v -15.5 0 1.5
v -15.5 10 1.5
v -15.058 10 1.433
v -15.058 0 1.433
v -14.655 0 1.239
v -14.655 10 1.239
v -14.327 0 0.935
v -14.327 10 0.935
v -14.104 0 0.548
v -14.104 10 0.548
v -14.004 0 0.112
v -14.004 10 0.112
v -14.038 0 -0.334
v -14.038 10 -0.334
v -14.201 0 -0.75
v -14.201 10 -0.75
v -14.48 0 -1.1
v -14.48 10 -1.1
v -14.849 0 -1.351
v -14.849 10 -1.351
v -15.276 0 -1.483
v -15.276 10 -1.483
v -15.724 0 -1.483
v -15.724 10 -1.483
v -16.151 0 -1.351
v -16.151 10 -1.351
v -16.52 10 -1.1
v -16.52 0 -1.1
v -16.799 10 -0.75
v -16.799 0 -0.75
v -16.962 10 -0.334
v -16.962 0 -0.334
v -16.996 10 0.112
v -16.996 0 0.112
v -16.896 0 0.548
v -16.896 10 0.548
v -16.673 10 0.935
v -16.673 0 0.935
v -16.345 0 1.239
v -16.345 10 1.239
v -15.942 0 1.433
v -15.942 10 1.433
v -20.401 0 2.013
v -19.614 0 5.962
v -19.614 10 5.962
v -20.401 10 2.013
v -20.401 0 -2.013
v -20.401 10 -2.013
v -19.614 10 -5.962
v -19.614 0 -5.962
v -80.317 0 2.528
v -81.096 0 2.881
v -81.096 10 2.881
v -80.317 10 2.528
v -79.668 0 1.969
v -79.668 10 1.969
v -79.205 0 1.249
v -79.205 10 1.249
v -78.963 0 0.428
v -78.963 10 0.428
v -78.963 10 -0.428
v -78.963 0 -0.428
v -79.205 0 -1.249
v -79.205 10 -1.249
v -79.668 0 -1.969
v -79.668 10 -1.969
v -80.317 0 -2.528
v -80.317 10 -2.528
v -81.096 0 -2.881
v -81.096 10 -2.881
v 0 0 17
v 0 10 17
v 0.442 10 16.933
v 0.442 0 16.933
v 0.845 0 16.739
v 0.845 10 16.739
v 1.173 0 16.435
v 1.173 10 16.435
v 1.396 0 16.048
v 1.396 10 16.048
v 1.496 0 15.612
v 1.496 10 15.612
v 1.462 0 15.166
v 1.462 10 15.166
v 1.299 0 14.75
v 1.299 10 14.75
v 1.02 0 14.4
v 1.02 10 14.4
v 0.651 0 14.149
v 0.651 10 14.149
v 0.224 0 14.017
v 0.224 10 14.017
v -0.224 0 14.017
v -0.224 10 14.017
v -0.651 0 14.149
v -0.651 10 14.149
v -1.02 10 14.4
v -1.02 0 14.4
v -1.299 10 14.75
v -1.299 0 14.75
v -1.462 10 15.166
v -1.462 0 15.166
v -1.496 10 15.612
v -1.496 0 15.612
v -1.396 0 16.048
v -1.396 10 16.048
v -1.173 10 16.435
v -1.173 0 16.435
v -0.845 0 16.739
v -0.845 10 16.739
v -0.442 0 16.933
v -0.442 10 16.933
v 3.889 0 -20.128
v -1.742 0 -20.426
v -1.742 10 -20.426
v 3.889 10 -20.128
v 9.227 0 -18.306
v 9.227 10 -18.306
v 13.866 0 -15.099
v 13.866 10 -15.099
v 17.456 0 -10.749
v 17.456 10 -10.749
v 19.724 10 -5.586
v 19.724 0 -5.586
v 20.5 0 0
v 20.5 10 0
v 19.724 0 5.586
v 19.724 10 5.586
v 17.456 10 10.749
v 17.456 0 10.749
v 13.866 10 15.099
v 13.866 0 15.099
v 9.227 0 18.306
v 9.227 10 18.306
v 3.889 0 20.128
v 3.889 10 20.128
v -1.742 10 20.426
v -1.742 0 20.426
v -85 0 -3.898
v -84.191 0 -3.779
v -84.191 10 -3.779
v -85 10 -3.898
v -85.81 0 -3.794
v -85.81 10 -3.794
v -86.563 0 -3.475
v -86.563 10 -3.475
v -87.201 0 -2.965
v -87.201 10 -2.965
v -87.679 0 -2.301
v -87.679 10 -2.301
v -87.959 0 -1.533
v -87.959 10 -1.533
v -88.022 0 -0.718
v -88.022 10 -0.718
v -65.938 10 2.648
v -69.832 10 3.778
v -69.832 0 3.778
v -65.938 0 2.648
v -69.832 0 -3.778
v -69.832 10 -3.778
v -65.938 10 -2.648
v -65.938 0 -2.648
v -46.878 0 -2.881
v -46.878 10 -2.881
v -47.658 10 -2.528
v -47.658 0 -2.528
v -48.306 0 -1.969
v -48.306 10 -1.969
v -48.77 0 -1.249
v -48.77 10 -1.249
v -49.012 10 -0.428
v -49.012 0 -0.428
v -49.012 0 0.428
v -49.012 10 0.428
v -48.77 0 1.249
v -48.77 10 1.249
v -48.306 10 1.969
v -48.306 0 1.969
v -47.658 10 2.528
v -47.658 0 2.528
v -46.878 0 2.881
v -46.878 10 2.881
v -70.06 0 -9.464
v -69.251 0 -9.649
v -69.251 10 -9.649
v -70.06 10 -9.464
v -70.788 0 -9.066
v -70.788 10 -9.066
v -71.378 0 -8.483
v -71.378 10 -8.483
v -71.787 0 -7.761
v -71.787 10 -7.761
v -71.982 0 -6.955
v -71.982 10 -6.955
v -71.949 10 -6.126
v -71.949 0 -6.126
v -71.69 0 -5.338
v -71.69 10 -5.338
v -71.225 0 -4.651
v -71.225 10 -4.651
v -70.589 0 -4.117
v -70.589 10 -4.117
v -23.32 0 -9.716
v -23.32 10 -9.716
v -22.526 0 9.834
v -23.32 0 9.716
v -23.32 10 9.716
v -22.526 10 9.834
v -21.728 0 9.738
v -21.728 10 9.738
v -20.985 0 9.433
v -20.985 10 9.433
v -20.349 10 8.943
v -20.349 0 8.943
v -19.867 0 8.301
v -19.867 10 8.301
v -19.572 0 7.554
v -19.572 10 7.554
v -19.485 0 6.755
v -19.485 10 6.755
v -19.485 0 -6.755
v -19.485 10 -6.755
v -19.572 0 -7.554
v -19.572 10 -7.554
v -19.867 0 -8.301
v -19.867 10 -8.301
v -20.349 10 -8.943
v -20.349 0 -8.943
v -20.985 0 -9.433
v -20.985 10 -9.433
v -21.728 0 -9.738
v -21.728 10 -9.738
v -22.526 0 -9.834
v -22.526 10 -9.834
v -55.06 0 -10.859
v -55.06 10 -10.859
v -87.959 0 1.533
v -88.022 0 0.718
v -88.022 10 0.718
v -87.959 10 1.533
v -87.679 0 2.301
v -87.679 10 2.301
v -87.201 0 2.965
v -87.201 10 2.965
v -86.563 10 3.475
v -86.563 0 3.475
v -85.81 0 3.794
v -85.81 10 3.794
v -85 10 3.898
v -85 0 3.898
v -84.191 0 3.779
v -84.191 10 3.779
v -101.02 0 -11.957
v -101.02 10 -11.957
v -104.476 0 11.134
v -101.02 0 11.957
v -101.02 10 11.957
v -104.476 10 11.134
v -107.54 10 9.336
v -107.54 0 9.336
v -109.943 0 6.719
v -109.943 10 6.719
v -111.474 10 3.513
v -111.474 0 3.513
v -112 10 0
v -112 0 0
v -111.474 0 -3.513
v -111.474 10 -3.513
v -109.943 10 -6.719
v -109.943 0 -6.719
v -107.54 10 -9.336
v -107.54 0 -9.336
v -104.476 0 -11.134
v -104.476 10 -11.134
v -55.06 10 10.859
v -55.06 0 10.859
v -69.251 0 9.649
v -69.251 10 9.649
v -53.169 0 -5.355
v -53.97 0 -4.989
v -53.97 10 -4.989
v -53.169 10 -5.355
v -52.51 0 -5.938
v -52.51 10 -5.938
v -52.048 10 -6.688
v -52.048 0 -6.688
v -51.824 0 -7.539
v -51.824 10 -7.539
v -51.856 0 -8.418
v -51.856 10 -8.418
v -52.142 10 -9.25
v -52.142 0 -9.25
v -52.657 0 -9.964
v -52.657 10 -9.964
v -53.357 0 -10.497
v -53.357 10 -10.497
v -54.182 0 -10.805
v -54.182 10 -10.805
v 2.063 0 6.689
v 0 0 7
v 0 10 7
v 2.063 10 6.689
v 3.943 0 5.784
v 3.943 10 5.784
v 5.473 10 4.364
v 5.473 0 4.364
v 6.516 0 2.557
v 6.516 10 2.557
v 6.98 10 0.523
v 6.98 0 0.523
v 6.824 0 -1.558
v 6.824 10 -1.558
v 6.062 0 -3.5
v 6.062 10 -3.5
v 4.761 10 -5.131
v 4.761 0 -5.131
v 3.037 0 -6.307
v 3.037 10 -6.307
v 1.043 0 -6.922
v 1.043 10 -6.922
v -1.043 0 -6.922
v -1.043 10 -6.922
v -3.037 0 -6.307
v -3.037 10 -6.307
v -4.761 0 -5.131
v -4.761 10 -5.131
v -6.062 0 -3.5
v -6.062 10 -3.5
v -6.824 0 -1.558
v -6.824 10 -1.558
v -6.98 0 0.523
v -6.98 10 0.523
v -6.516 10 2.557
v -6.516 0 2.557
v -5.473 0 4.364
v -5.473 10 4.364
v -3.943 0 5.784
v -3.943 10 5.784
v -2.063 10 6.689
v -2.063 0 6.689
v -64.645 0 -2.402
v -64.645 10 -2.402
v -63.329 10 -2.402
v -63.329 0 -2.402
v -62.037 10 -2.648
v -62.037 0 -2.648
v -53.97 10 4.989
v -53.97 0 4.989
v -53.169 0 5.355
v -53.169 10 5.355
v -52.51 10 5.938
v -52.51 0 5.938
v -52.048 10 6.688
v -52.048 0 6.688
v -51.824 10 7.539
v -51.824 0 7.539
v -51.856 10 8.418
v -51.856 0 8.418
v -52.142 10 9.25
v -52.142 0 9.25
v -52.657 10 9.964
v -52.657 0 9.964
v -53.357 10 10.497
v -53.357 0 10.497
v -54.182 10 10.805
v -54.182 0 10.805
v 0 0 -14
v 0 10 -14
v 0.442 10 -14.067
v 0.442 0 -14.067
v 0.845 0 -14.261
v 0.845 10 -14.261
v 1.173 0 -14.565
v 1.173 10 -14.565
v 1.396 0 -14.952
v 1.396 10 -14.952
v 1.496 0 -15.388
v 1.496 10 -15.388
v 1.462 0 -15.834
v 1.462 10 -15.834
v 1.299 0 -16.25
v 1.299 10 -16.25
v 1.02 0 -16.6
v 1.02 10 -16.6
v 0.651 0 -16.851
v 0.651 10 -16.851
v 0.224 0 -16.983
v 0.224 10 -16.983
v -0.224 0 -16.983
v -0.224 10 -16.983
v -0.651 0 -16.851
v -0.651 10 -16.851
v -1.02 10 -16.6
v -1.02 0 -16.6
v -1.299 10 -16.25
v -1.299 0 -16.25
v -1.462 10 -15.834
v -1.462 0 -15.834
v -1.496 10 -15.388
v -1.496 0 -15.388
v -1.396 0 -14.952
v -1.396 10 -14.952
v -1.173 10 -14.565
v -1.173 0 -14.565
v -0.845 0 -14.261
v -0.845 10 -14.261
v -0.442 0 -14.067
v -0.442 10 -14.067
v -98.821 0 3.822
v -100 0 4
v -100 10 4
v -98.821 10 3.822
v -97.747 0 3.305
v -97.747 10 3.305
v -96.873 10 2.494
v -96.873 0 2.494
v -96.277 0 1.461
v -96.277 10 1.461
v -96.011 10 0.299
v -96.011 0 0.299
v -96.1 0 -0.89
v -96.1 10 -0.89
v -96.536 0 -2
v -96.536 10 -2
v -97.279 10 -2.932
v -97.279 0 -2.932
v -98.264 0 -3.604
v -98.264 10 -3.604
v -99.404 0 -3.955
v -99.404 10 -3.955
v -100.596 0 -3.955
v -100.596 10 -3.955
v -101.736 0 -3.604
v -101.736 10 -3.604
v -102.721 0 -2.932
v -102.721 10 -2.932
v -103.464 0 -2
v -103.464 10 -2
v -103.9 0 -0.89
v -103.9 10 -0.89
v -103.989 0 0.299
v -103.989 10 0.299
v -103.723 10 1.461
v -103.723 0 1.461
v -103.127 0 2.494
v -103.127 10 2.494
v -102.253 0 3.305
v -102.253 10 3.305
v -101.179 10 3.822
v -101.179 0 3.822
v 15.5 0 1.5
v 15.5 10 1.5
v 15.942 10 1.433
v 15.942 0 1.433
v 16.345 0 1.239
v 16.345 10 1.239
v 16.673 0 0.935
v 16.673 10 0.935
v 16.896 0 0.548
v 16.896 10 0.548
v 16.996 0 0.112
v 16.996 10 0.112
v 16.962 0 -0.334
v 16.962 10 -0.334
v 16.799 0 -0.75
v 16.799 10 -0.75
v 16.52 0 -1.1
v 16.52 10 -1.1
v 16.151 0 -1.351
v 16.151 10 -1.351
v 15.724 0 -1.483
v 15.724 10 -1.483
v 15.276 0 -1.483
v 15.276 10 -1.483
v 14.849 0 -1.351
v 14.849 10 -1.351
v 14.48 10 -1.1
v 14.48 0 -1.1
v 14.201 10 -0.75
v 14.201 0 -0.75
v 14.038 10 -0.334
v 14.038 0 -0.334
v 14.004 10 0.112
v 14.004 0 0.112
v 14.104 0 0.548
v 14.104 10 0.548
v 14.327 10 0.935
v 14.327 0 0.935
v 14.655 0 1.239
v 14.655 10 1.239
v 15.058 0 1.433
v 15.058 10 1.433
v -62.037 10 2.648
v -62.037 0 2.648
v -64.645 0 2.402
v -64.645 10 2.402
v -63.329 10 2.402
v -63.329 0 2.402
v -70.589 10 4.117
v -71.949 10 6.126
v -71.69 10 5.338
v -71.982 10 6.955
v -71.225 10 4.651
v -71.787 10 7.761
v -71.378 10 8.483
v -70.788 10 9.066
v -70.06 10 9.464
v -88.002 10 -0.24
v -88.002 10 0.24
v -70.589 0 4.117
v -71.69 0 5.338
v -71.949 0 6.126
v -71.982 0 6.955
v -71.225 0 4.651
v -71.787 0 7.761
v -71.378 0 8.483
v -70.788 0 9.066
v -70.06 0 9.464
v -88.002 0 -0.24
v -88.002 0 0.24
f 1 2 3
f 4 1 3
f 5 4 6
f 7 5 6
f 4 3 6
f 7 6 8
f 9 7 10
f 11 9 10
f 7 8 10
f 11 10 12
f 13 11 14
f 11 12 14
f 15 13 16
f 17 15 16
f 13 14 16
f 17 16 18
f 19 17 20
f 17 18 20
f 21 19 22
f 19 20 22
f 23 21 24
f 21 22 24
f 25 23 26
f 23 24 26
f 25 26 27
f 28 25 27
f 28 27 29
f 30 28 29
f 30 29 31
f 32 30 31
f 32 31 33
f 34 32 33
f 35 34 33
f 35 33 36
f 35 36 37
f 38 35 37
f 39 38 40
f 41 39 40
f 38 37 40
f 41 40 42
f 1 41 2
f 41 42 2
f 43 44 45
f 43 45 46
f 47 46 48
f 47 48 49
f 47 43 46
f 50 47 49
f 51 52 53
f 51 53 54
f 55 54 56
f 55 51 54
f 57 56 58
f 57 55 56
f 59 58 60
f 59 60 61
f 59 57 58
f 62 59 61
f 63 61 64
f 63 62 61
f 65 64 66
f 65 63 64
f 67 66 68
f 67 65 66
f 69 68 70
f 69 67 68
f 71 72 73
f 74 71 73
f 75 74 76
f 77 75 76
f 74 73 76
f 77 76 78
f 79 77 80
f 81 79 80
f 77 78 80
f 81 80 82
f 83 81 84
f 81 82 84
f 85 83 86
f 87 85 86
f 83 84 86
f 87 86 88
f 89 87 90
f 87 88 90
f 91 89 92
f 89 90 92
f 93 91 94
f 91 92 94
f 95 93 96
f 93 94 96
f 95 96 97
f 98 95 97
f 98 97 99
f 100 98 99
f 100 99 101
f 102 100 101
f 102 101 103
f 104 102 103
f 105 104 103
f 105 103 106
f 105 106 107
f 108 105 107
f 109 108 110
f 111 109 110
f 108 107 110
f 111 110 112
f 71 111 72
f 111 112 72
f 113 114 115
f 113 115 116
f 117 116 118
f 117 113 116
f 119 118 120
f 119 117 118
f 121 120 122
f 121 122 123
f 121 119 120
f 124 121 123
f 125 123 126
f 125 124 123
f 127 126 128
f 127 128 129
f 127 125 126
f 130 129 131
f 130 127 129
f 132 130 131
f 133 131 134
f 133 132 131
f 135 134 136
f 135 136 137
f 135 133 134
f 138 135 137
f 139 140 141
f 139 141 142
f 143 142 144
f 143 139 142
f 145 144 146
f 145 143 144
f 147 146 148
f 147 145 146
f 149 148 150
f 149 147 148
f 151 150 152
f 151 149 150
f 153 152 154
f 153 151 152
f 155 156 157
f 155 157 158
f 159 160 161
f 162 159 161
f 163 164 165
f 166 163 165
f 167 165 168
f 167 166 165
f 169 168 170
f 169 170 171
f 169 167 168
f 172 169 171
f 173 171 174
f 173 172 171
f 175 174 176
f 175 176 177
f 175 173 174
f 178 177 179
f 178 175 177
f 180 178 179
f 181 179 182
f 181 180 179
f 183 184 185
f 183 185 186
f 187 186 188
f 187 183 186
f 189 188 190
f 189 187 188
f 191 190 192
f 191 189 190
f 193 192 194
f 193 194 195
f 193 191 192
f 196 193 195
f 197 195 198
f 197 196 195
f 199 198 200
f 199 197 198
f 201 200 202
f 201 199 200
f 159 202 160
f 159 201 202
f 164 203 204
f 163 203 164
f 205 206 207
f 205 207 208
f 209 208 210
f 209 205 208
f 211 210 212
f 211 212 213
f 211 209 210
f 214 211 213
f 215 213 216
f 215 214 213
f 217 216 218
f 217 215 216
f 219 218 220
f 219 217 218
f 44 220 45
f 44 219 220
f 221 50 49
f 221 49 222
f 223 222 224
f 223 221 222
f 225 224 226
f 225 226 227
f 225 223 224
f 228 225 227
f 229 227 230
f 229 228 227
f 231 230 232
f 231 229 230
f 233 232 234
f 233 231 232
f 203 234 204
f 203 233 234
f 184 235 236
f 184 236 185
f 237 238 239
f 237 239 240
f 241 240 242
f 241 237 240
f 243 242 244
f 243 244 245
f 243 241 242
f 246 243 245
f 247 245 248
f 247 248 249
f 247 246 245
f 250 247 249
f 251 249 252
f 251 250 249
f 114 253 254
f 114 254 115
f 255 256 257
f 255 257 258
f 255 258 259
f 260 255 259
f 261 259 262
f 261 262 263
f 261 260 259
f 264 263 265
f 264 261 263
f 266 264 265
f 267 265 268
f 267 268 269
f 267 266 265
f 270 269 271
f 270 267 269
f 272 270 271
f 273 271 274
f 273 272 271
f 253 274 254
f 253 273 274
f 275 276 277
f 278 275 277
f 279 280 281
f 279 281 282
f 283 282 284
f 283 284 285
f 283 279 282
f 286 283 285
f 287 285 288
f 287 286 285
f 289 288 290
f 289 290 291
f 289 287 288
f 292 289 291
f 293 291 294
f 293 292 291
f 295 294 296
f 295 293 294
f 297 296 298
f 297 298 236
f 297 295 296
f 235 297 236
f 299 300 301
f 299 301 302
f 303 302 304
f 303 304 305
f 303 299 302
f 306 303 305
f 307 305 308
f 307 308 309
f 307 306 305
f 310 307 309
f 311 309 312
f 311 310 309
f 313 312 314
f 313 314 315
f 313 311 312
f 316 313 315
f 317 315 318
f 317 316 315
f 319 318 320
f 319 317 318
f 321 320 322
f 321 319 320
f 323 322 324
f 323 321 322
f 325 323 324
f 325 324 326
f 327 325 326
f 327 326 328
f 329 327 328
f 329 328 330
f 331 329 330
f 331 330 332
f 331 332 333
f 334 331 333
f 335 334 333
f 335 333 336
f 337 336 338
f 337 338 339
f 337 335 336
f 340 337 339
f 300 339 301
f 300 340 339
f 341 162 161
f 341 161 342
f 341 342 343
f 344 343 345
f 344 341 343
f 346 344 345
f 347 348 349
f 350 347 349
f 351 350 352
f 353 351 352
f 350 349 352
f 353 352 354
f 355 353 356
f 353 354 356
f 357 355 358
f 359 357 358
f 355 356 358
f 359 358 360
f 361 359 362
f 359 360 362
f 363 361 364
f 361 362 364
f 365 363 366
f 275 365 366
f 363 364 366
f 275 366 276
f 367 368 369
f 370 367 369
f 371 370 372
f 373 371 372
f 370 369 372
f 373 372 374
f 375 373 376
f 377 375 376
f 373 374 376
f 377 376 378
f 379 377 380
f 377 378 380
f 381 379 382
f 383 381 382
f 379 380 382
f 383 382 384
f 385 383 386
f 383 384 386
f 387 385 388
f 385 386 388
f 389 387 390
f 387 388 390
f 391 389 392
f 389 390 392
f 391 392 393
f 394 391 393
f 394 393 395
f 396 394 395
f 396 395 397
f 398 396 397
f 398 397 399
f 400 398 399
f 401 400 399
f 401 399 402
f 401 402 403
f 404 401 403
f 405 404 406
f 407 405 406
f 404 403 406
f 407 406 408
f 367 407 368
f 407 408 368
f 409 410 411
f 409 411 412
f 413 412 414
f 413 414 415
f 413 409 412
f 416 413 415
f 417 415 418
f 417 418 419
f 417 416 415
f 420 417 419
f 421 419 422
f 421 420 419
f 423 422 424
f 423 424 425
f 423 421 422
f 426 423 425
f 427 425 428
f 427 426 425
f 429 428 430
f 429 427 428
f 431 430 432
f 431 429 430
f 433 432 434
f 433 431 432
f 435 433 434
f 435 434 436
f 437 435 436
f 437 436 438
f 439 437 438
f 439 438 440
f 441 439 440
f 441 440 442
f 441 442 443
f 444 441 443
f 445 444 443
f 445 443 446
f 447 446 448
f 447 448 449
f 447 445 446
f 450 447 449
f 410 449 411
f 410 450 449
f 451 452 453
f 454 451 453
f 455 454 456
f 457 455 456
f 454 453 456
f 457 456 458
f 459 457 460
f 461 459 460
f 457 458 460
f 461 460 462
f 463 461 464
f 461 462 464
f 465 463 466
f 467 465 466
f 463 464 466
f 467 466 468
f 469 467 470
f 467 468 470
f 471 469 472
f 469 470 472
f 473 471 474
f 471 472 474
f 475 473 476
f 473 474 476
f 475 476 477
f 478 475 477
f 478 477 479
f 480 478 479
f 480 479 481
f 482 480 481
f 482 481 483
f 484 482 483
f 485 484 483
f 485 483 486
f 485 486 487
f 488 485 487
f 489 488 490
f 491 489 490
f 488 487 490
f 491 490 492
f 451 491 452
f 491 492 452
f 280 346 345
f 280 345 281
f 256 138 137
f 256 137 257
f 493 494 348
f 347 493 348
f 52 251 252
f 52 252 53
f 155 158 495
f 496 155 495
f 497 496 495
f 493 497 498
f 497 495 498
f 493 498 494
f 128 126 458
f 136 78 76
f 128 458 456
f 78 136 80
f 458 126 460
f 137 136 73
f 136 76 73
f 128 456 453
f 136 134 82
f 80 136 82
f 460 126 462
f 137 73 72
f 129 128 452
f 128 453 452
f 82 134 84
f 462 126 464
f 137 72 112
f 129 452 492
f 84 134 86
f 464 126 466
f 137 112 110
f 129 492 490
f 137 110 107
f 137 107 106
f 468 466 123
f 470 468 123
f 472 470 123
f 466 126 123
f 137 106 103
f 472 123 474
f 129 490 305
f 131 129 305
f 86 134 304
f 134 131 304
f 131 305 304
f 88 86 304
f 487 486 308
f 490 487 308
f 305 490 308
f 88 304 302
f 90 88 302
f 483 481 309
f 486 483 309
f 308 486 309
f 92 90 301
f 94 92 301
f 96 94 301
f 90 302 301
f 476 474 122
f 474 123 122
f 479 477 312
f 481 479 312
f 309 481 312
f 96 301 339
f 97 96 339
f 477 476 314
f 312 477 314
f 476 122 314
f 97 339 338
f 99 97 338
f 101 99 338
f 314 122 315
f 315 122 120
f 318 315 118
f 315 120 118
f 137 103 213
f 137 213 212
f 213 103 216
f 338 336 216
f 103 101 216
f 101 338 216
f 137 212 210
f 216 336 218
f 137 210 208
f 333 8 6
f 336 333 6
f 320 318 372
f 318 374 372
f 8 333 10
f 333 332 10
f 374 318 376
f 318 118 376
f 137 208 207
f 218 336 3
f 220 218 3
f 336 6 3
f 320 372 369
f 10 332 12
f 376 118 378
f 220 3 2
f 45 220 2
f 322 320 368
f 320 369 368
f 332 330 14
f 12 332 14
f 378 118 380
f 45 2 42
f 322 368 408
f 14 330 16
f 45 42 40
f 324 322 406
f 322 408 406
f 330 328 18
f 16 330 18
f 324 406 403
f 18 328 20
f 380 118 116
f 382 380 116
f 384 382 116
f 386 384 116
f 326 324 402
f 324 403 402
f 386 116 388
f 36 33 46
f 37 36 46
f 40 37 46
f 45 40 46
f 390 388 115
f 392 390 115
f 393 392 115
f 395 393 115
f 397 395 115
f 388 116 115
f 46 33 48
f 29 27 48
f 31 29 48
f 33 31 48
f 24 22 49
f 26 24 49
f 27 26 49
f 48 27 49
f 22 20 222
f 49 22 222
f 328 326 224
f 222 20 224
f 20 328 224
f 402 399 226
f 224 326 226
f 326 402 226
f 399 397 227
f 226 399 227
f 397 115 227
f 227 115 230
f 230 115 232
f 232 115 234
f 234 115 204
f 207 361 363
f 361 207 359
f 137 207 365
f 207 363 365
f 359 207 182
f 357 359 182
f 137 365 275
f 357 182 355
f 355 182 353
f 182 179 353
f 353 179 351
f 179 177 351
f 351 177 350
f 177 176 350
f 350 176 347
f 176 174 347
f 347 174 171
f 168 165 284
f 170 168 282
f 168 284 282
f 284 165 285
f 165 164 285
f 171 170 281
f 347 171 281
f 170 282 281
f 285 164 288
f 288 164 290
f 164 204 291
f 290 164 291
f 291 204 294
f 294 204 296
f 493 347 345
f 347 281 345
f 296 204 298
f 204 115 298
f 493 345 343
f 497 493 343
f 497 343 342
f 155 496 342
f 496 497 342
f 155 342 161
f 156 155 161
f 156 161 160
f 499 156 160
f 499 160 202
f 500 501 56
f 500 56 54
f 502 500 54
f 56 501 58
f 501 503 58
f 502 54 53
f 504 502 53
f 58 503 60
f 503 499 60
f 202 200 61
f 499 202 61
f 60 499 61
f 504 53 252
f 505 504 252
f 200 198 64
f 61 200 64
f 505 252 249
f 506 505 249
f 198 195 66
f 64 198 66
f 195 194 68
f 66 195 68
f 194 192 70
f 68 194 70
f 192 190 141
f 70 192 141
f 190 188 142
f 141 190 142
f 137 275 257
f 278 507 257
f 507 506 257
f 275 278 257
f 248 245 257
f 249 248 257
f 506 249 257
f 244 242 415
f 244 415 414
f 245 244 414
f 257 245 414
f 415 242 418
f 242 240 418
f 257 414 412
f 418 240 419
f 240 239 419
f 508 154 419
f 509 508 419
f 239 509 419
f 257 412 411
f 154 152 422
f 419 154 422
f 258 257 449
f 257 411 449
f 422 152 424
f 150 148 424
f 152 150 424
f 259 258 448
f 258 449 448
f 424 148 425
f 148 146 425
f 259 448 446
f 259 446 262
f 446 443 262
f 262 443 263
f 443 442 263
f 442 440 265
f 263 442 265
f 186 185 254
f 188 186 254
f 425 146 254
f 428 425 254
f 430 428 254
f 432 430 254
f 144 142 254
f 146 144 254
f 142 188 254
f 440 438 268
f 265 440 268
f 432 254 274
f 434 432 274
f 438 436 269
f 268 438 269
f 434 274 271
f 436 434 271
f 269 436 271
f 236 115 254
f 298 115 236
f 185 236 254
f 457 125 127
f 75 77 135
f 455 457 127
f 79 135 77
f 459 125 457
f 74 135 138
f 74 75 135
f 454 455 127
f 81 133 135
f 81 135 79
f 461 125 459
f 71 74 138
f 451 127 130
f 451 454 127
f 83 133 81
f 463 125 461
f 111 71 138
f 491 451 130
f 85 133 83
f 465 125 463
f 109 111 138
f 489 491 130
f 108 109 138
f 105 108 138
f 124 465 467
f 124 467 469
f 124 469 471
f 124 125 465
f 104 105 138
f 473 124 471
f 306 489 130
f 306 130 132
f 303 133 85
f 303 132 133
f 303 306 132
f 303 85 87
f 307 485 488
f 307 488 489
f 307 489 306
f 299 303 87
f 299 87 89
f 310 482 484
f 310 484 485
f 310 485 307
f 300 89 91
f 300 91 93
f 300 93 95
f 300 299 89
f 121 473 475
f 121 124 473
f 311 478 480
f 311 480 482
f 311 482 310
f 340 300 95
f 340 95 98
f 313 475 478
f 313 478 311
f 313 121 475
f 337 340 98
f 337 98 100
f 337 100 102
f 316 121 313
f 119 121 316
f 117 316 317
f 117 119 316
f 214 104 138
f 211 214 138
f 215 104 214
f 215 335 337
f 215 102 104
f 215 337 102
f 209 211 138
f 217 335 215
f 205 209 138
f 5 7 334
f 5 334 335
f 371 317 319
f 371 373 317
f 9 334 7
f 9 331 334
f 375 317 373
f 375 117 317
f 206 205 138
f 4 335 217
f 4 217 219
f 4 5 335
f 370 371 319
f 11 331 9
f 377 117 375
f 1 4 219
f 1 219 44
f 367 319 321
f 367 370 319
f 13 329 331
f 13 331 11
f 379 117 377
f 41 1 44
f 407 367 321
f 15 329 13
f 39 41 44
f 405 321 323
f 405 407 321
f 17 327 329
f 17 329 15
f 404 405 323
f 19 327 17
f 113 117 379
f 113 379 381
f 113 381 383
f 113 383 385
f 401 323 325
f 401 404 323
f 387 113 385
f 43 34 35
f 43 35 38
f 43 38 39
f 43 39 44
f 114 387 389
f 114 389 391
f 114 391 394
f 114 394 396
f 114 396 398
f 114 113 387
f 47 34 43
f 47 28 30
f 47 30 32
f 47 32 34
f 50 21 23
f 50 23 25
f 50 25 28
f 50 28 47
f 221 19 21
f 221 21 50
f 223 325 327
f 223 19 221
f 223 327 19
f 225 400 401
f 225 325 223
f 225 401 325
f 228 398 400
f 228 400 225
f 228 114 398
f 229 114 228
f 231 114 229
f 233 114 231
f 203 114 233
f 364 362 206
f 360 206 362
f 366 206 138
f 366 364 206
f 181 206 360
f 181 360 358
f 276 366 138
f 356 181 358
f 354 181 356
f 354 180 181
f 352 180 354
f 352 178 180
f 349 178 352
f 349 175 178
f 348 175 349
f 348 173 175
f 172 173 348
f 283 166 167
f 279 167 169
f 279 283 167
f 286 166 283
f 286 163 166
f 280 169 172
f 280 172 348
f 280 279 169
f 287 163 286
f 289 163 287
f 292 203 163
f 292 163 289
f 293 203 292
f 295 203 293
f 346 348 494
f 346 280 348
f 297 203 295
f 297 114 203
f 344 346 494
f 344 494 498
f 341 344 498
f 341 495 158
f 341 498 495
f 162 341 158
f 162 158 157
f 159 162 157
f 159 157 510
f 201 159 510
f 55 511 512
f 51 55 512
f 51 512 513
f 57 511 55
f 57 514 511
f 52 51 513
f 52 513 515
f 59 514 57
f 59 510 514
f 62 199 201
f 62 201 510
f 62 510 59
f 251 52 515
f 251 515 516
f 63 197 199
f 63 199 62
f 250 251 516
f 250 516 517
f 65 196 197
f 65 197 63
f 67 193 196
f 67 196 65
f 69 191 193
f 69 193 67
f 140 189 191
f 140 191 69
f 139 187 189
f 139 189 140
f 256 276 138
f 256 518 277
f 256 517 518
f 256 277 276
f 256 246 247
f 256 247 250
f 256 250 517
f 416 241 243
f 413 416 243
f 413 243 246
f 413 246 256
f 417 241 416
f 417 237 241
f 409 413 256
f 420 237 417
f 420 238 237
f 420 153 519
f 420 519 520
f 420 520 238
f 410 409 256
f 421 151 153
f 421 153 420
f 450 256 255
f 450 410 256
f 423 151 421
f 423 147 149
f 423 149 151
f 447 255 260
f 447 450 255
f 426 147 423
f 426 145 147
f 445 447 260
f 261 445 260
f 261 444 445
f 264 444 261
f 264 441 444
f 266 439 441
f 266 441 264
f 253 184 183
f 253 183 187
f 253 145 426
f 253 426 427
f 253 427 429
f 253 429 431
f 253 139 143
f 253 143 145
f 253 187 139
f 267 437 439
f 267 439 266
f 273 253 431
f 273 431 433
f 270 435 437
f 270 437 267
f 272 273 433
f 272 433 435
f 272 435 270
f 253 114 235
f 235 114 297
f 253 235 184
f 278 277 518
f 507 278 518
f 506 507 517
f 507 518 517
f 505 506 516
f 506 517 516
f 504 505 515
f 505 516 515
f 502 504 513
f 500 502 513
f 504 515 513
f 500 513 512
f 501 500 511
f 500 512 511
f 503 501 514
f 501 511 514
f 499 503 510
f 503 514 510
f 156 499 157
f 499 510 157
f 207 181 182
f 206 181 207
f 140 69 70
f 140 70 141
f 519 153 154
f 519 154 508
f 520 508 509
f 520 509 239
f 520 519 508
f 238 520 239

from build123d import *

# Parameters (mm, degrees)
SKETCH1_R           = 7
SKETCH1_R_2         = 4
BOSS_EXTRUDE1_DEPTH = 10
SKETCH2_R           = 1.5
CUT_EXTRUDE1_DEPTH  = 10


with BuildPart() as part:
    # Sketch1 → Boss-Extrude1 (new body)
    with BuildSketch(Plane(origin=(0, 0, 0), x_dir=(1, 0, 0), z_dir=(0, 1, 0))):
        with BuildLine():
            Line((-1.7425, -20.4258095), (-101.02, -11.956571415))
            ThreePointArc((-101.02, -11.956571415), (-112, 0), (-101.02, 11.956571415))
            Line((-101.02, 11.956571415), (-1.7425, 20.4258095))
            ThreePointArc((-1.7425, 20.4258095), (20.5, 0), (-1.7425, -20.4258095))
        make_face()
        with Locations(Location((0, 0, 0), (0, 0, 270))):
            Circle(SKETCH1_R, mode=Mode.SUBTRACT)
        with Locations(Location((-100, 0, 0), (0, 0, 270))):
            Circle(SKETCH1_R_2, mode=Mode.SUBTRACT)
        with BuildLine():
            Line((-84.191001334, -3.779047898), (-81.096242799, -2.881194367))
            ThreePointArc((-81.096242799, -2.881194367), (-78.932136943, 0), (-81.096242799, 2.881194367))
            Line((-81.096242799, 2.881194367), (-84.191001334, 3.779047898))
            ThreePointArc((-84.191001334, 3.779047898), (-86.899619701, 3.241548046), (-88.021516382, 0.718282824))
            ThreePointArc((-88.021516382, 0.718282824), (-88, 0), (-88.021516382, -0.718282824))
            ThreePointArc((-88.021516382, -0.718282824), (-86.899619701, -3.241548046), (-84.191001334, -3.779047898))
        make_face(mode=Mode.SUBTRACT)
        with BuildLine():
            Line((-69.832249651, -3.778216146), (-65.93770065, -2.648326841))
            ThreePointArc((-65.93770065, -2.648326841), (-63.987280982, -2.371113698), (-62.036861314, -2.648326841))
            Line((-62.036861314, -2.648326841), (-53.969530614, -4.988826518))
            ThreePointArc((-53.969530614, -4.988826518), (-51.855920685, -8.418131938), (-55.060424757, -10.859163739))
            Line((-55.060424757, -10.859163739), (-69.251355507, -9.648553367))
            ThreePointArc((-69.251355507, -9.648553367), (-71.98177462, -6.95483008), (-69.832249651, -3.778216146))
        make_face(mode=Mode.SUBTRACT)
        with BuildLine():
            Line((-46.878319164, -2.881194367), (-23.320026626, -9.715942825))
            ThreePointArc((-23.320026626, -9.715942825), (-20.349346369, -8.942517006), (-19.613817698, -5.962227378))
            ThreePointArc((-19.613817698, -5.962227378), (-20.5, 0), (-19.613817698, 5.962227378))
            ThreePointArc((-19.613817698, 5.962227378), (-20.349346369, 8.942517006), (-23.320026626, 9.715942825))
            Line((-23.320026626, 9.715942825), (-46.878319164, 2.881194367))
            ThreePointArc((-46.878319164, 2.881194367), (-49.042425021, 0), (-46.878319164, -2.881194367))
        make_face(mode=Mode.SUBTRACT)
        with BuildLine():
            Line((-62.036861314, 2.648326841), (-53.969530614, 4.988826518))
            ThreePointArc((-53.969530614, 4.988826518), (-51.855920685, 8.418131938), (-55.060424757, 10.859163739))
            Line((-55.060424757, 10.859163739), (-69.251355507, 9.648553367))
            ThreePointArc((-69.251355507, 9.648553367), (-71.98177462, 6.95483008), (-69.832249651, 3.778216146))
            Line((-69.832249651, 3.778216146), (-65.93770065, 2.648326841))
            ThreePointArc((-65.93770065, 2.648326841), (-63.987280982, 2.371113698), (-62.036861314, 2.648326841))
        make_face(mode=Mode.SUBTRACT)
    extrude(amount=BOSS_EXTRUDE1_DEPTH)

    # Sketch2 → Cut-Extrude1 (cut)
    with BuildSketch(Plane(origin=(0, 10, 0), x_dir=(1, 0, 0), z_dir=(0, 1, 0))):
        with Locations(Location((-15.5, 0, 0), (0, 0, 270))):
            Circle(SKETCH2_R)
        with Locations(Location((0, 15.5, 0), (0, 0, 270))):
            Circle(SKETCH2_R)
        with Locations(Location((15.5, 0, 0), (0, 0, 270))):
            Circle(SKETCH2_R)
        with Locations(Location((0, -15.5, 0), (0, 0, 270))):
            Circle(SKETCH2_R)
    extrude(amount=-CUT_EXTRUDE1_DEPTH, mode=Mode.SUBTRACT)


solid = part.part
